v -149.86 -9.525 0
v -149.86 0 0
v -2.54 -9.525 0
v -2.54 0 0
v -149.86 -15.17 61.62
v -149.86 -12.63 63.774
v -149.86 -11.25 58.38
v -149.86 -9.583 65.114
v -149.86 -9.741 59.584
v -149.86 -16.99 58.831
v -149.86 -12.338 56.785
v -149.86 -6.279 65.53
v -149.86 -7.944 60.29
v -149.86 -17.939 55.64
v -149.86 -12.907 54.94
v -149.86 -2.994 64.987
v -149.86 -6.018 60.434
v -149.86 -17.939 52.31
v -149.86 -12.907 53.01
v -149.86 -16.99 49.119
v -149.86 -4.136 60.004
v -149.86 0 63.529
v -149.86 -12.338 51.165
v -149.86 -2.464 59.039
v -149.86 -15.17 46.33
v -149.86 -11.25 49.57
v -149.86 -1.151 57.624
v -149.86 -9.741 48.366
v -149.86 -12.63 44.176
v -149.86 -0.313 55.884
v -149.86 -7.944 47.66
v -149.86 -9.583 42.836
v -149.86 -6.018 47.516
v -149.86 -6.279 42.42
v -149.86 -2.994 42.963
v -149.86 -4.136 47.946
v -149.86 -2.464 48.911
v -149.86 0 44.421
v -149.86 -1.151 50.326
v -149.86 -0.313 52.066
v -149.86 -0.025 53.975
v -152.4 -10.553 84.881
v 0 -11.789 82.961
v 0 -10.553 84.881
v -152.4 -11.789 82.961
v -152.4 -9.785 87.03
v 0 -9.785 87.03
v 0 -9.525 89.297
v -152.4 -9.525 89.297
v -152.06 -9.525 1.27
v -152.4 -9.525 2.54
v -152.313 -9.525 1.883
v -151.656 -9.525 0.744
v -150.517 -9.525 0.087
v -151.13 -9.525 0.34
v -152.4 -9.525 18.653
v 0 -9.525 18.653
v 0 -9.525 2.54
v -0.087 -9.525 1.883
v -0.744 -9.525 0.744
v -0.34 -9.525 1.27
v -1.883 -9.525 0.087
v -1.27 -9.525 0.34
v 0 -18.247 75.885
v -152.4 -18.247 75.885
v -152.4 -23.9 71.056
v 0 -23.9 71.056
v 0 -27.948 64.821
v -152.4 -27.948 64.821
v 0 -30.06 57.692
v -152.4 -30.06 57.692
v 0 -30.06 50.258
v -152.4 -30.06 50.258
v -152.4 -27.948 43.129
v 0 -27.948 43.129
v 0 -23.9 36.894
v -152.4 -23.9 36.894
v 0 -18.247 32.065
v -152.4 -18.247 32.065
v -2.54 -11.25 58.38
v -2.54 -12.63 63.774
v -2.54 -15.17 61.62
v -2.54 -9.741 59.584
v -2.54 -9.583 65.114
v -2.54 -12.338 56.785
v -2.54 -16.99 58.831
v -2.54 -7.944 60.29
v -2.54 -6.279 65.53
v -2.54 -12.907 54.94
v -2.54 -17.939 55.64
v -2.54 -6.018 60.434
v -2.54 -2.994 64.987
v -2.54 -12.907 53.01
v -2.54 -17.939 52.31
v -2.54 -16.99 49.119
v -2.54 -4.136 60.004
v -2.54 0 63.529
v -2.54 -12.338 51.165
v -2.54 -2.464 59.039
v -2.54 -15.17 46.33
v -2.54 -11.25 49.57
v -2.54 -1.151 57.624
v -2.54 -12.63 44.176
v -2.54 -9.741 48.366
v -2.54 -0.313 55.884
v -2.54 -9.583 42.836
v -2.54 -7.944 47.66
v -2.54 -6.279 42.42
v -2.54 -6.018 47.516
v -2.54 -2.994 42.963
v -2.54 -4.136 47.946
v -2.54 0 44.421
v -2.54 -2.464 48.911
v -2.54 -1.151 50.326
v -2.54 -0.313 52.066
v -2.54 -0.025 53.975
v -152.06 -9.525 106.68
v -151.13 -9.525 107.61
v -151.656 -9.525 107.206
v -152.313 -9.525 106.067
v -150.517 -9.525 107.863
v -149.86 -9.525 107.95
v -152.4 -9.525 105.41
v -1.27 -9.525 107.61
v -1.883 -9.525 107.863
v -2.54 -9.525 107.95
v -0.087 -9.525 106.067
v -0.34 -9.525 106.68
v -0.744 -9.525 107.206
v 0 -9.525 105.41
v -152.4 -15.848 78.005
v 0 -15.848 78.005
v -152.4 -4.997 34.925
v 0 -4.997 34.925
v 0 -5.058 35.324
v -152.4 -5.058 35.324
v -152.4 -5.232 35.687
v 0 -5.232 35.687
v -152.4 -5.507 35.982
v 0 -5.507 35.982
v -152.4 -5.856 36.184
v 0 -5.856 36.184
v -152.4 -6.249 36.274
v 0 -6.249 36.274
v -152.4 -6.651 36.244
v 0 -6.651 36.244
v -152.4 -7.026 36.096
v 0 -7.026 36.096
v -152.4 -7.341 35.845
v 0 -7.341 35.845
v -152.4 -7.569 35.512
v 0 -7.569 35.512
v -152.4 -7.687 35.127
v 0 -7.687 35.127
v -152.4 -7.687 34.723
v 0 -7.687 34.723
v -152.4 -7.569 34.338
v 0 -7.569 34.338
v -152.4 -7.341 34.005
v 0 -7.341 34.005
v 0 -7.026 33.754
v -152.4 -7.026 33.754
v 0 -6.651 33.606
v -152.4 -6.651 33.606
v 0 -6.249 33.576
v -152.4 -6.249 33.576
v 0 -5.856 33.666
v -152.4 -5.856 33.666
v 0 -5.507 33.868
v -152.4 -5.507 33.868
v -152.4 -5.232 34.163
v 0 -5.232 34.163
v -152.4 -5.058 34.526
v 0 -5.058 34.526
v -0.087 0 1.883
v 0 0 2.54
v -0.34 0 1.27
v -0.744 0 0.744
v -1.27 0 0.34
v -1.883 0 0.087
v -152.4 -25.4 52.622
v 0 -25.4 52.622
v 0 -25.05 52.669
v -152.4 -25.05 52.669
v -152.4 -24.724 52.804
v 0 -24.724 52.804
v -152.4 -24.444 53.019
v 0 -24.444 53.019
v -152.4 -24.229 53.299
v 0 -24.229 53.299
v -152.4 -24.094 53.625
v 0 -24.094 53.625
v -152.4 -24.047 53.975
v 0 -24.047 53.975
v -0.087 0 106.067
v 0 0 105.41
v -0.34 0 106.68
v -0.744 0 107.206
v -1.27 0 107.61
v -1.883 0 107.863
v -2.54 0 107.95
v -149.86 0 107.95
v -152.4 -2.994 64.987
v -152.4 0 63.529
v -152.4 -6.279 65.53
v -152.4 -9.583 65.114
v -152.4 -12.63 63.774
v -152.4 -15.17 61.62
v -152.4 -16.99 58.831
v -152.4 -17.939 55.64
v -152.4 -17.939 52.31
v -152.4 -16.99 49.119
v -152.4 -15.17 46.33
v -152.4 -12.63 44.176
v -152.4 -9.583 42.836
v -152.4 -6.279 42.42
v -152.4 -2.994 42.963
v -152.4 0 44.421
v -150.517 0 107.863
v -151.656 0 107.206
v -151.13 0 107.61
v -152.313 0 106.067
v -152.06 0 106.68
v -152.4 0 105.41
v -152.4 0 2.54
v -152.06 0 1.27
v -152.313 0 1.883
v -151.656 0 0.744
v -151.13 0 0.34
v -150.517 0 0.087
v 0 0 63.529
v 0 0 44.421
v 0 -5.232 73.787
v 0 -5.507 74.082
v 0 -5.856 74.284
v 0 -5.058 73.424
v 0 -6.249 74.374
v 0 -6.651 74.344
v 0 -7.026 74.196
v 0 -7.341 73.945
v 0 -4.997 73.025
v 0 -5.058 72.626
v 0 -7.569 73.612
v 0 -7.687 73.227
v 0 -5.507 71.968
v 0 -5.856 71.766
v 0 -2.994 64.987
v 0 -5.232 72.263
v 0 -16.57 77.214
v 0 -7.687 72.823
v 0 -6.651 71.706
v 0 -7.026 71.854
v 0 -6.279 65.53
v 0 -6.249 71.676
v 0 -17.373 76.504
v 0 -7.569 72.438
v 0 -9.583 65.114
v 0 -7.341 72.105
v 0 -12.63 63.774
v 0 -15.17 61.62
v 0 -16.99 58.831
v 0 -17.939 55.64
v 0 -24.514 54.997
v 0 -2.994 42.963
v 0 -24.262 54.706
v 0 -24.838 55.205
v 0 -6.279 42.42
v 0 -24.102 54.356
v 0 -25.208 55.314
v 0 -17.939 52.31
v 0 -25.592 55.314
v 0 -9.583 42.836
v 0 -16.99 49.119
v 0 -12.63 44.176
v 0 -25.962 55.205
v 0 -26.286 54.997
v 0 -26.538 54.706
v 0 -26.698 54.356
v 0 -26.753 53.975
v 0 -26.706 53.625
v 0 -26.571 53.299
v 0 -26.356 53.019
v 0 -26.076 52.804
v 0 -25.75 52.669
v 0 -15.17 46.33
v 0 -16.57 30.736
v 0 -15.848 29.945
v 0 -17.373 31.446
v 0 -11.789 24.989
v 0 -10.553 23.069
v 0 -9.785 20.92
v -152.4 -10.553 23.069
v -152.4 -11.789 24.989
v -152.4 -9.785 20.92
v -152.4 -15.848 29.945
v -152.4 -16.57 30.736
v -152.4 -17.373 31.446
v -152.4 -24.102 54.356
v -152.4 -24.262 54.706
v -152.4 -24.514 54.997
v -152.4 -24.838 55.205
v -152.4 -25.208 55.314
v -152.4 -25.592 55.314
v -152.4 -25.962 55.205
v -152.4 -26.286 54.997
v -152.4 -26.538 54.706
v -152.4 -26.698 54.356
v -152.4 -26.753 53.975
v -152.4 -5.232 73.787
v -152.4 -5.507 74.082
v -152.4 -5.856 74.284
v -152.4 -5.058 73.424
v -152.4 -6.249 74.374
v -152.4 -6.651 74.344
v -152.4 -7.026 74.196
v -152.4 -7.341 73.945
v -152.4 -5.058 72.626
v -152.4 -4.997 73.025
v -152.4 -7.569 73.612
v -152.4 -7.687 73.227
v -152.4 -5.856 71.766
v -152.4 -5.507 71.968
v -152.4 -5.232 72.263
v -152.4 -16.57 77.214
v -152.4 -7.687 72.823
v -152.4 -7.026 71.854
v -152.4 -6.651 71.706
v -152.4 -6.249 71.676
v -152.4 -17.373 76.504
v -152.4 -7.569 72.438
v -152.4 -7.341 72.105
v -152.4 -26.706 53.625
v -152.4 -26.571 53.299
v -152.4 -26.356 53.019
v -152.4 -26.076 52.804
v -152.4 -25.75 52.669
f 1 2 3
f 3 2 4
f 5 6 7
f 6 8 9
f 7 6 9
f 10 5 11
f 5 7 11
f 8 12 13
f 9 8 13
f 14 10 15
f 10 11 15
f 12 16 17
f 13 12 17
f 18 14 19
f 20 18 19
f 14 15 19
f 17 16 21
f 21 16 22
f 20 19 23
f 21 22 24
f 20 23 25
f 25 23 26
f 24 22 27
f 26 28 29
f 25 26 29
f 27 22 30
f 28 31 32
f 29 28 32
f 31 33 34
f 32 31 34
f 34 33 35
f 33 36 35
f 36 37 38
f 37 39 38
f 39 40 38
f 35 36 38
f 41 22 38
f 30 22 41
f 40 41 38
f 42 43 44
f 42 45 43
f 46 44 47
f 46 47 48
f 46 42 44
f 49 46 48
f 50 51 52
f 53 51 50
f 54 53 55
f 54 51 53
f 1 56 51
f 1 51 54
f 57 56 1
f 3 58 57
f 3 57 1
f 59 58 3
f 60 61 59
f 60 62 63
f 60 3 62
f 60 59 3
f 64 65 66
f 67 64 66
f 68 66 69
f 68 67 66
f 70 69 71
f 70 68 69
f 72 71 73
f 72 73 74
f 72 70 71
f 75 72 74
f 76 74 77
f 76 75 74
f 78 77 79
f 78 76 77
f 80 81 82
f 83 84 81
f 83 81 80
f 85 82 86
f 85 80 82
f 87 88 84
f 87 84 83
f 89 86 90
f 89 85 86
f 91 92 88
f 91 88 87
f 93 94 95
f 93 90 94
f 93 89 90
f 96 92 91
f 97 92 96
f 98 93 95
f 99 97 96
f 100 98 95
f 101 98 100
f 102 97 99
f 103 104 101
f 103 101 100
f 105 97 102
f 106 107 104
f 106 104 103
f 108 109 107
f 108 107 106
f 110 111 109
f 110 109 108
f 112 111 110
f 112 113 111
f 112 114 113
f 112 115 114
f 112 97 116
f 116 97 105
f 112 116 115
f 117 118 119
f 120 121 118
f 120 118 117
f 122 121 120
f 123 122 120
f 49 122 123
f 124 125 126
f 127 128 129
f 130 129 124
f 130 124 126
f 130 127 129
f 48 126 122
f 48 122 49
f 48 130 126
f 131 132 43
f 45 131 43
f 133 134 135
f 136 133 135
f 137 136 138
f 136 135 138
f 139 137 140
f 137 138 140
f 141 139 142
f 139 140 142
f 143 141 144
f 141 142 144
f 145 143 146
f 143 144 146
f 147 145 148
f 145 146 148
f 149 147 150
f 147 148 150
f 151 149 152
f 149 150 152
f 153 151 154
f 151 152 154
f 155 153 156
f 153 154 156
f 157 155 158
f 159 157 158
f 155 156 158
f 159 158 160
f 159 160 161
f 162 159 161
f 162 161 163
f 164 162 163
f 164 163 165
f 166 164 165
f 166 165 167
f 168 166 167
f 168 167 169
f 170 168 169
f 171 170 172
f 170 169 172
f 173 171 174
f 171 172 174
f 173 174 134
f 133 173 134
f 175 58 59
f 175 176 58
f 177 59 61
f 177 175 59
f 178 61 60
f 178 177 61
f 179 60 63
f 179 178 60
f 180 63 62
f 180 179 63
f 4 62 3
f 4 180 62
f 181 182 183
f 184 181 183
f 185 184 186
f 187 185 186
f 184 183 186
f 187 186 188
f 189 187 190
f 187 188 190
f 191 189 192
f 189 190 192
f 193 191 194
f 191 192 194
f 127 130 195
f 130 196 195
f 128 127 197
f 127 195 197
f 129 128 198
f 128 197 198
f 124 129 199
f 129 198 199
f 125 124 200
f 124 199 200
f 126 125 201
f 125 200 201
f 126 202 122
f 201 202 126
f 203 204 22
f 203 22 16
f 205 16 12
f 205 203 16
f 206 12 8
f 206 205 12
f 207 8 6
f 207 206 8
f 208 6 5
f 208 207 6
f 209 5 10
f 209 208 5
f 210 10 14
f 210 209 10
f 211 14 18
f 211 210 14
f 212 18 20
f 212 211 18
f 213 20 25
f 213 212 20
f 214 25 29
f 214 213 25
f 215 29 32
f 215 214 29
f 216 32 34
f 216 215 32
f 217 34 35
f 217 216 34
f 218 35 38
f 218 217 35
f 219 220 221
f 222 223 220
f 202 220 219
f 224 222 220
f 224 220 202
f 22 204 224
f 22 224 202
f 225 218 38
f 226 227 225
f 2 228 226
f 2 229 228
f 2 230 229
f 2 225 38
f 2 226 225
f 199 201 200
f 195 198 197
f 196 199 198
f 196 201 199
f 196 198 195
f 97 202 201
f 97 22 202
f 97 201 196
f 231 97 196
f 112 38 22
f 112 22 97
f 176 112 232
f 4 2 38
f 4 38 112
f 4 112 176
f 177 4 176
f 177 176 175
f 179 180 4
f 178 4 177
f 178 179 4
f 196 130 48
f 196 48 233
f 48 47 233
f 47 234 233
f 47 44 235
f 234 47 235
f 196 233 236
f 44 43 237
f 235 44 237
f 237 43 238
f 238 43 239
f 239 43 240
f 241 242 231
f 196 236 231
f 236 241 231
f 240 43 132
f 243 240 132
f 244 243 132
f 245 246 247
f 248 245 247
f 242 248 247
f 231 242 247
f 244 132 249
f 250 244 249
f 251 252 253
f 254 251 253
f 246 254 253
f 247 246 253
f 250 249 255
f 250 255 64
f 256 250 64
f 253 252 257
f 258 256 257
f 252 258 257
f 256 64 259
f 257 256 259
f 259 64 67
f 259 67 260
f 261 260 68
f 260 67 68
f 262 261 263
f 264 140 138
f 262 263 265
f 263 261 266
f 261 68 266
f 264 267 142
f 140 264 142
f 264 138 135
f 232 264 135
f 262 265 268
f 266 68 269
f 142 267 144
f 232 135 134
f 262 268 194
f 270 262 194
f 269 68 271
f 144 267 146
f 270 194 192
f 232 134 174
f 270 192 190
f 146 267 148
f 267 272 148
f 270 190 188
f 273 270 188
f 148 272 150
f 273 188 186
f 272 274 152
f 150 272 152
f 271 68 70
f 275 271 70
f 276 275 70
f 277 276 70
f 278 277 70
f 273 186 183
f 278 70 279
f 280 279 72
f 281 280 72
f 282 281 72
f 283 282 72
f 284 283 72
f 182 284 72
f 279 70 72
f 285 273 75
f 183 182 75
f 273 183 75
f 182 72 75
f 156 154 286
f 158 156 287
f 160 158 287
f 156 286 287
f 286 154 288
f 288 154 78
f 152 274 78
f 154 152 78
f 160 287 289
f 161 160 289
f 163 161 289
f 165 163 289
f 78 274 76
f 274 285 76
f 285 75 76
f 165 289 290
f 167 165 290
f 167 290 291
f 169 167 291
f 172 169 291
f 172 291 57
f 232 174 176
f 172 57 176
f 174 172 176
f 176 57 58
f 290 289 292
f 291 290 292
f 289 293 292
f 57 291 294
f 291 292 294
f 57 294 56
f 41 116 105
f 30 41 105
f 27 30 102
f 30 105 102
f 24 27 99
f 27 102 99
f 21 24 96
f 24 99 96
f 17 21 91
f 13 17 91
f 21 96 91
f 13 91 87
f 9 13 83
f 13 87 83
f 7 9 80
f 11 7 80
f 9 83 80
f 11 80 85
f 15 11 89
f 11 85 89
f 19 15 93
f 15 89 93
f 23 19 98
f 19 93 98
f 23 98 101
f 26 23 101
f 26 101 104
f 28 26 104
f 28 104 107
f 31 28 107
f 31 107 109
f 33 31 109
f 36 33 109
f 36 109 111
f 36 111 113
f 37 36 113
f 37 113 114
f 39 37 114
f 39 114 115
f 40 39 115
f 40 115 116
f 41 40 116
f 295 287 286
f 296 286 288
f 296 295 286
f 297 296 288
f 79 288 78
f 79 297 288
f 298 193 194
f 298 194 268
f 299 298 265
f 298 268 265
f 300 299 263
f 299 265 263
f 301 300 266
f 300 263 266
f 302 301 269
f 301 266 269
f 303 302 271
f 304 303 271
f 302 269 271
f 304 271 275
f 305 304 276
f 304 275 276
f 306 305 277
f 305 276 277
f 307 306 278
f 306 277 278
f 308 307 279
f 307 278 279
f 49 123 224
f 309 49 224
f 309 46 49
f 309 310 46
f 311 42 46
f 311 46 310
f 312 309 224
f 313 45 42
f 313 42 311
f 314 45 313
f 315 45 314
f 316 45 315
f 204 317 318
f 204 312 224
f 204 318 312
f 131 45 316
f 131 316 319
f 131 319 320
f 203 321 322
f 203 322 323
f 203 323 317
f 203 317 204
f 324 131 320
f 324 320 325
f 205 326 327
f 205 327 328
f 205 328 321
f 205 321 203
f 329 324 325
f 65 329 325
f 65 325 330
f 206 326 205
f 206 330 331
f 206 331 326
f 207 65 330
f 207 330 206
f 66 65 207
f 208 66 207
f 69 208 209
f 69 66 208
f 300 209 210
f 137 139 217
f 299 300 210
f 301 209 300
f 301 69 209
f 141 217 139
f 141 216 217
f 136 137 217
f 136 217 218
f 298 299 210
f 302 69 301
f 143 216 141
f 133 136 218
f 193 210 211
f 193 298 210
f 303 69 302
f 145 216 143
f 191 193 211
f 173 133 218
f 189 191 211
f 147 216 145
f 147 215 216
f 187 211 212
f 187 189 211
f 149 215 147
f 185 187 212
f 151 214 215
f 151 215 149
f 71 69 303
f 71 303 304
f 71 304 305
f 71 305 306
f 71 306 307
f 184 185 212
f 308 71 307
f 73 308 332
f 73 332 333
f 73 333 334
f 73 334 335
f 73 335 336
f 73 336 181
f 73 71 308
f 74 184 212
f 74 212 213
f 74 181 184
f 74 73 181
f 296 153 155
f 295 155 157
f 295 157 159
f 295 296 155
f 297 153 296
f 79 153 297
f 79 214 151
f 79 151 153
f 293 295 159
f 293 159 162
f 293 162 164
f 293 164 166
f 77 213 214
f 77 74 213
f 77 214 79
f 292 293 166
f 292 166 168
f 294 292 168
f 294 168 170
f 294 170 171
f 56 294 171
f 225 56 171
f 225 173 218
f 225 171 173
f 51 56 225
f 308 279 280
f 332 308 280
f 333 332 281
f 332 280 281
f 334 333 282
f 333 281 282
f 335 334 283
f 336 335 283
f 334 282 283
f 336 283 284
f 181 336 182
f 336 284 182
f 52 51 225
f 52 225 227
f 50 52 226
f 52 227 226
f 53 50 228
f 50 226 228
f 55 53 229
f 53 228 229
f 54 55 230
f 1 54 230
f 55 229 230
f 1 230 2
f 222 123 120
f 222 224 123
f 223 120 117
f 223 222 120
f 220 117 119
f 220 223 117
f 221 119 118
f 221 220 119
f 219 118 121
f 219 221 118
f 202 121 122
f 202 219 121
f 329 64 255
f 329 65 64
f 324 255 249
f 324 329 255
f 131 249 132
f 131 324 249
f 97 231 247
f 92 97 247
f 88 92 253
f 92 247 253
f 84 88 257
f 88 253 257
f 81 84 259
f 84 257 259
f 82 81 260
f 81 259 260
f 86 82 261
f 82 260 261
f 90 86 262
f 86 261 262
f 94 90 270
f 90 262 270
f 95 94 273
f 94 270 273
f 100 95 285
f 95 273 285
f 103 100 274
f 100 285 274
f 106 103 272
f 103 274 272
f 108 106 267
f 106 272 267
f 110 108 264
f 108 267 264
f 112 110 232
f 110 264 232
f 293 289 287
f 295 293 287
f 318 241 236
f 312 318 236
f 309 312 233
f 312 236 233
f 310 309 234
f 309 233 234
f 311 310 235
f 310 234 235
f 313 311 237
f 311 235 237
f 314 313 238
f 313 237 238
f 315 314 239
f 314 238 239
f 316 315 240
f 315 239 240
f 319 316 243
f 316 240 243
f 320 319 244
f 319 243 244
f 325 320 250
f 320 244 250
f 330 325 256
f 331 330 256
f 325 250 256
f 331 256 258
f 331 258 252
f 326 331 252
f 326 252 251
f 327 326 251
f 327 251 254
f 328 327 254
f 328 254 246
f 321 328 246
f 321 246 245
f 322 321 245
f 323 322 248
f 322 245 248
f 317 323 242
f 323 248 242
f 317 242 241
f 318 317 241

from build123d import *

# Parameters (mm, degrees)
SKETCH1_W           = 152.4
SKETCH1_H           = 38.1
BOSS_EXTRUDE1_DEPTH = 107.95
SKETCH2_R           = 1.35255
CUT_EXTRUDE1_DEPTH  = 152.4
SKETCH3_R           = 6.477
CUT_EXTRUDE4_DEPTH  = 154.686
SKETCH4_R           = 11.557
CUT_EXTRUDE5_DEPTH  = 2.54
CUT_EXTRUDE6_DEPTH  = 152.4
CHAMFER1_SIZE       = 6.35
FILLET1_R           = 10
FILLET2_R           = 2.54


with BuildPart() as part:
    # Sketch1 → Boss-Extrude1 (new body)
    with BuildSketch(Plane.XY):
        with Locations((-76.2, -19.05)):
            Rectangle(SKETCH1_W, SKETCH1_H)
    extrude(amount=BOSS_EXTRUDE1_DEPTH)

    # Sketch2 → Cut-Extrude1 (cut)
    with BuildSketch(Plane(origin=(0, 0, 0), x_dir=(0, 0, -1), z_dir=(1, 0, 0))):
        with Locations(Location((-73.025, -6.35, 0), (0, 0, 90))):
            Circle(SKETCH2_R)
        with BuildLine():
            ThreePointArc((-52.62245, -25.4), (-53.018602723, -24.443602723), (-53.975, -24.04745))
            Line((-53.975, -24.04745), (-53.975, -26.75255))
            ThreePointArc((-53.975, -26.75255), (-53.018602723, -26.356397277), (-52.62245, -25.4))
        make_face()
        with BuildLine():
            Line((-53.975, -26.75255), (-53.975, -24.04745))
            ThreePointArc((-53.975, -24.04745), (-55.32755, -25.4), (-53.975, -26.75255))
        make_face()
        with Locations(Location((-34.925, -6.35, 0), (0, 0, 90))):
            Circle(SKETCH2_R)
    extrude(amount=-CUT_EXTRUDE1_DEPTH, mode=Mode.SUBTRACT)

    # Sketch3 → Cut-Extrude4 (cut)
    with BuildSketch(Plane(origin=(0, 0, 0), x_dir=(0, 0, -1), z_dir=(1, 0, 0))):
        with Locations(Location((-53.975, -6.5024, 0), (0, 0, 90))):
            Circle(SKETCH3_R)
    extrude(amount=-CUT_EXTRUDE4_DEPTH, mode=Mode.SUBTRACT)

    # Sketch4 → Cut-Extrude5 (cut)
    with BuildSketch(Plane(origin=(0, 0, 0), x_dir=(0, 0, -1), z_dir=(1, 0, 0))):
        with Locations((-53.975, -6.5024)):
            Circle(SKETCH4_R)
    cut_extrude5 = extrude(amount=-CUT_EXTRUDE5_DEPTH, mode=Mode.SUBTRACT)

    # Mirror1: Cut-Extrude5 across plane
    add(cut_extrude5.mirror(Plane(origin=(-76.2, 0, 0), x_dir=(0, 0, 1), z_dir=(1, 0, 0))), mode=Mode.SUBTRACT)

    # Sketch5 → Cut-Extrude6 (cut)
    with BuildSketch(Plane(origin=(0, 0, 0), x_dir=(0, 0, -1), z_dir=(1, 0, 0))):
        with BuildLine():
            Line((-107.95, -9.525), (-79.375, -9.525))
            ThreePointArc((-79.375, -9.525), (-53.975, -30.327663184), (-28.575, -9.525))
            Line((-28.575, -9.525), (0, -9.525))
            Line((0, -9.525), (0, -59.754484856))
            Line((0, -59.754484856), (-107.95, -59.754484856))
            Line((-107.95, -59.754484856), (-107.95, -9.525))
        make_face()
    extrude(amount=-CUT_EXTRUDE6_DEPTH, mode=Mode.SUBTRACT)

    # Chamfer1
    # the kernel refuses this chamfer: 6.35 mm, written as the material it adds along each edge
    with BuildSketch(Plane(origin=(0, -9.525, 79.375), x_dir=(0, -0.9387392646709182, -0.34462819525555927), z_dir=(-1, 0, 0))) as chamfer1_piece_1:
        with BuildLine():
            Line((7.921952063, 0), (-CHAMFER1_SIZE * 0.344628195256, CHAMFER1_SIZE * 0.938739264671))
            Line((-CHAMFER1_SIZE * 0.344628195256, CHAMFER1_SIZE * 0.938739264671), (0, 0))
            ThreePointArc((0, 0), (4.071956682, 0.304341963), (7.921952063, 0))
        make_face()
    extrude(amount=152.4)
    with BuildSketch(Plane(origin=(0, -9.525, 28.575), x_dir=(0, 0, -1), z_dir=(-1, 0, 0))) as chamfer1_piece_2:
        with BuildLine():
            Line((CHAMFER1_SIZE, 0), (-2.730128042, 7.436647454))
            ThreePointArc((-2.730128042, 7.436647454), (-1.117613332, 3.927390442), (0, 0))
            Line((0, 0), (CHAMFER1_SIZE, 0))
        make_face()
    extrude(amount=152.4)

    # Fillet1
    fillet1_edges = [part.edges().sort_by_distance(p)[0] for p in [
        (-76.2, -9.525, 85.725),
        (-76.2, -16.961647454, 31.305128042),
        (-76.2, -16.961647454, 76.644871958),
        (-76.2, -9.525, 22.225),
    ]]
    fillet(fillet1_edges, radius=FILLET1_R)

    # Fillet2
    fillet2_edges = [part.edges().sort_by_distance(p)[0] for p in [
        (-152.4, -4.7625, 107.95),
        (-152.4, -4.7625, 0),
        (0, -4.7625, 0),
        (0, -4.7625, 107.95),
    ]]
    fillet(fillet2_edges, radius=FILLET2_R)


solid = part.part
